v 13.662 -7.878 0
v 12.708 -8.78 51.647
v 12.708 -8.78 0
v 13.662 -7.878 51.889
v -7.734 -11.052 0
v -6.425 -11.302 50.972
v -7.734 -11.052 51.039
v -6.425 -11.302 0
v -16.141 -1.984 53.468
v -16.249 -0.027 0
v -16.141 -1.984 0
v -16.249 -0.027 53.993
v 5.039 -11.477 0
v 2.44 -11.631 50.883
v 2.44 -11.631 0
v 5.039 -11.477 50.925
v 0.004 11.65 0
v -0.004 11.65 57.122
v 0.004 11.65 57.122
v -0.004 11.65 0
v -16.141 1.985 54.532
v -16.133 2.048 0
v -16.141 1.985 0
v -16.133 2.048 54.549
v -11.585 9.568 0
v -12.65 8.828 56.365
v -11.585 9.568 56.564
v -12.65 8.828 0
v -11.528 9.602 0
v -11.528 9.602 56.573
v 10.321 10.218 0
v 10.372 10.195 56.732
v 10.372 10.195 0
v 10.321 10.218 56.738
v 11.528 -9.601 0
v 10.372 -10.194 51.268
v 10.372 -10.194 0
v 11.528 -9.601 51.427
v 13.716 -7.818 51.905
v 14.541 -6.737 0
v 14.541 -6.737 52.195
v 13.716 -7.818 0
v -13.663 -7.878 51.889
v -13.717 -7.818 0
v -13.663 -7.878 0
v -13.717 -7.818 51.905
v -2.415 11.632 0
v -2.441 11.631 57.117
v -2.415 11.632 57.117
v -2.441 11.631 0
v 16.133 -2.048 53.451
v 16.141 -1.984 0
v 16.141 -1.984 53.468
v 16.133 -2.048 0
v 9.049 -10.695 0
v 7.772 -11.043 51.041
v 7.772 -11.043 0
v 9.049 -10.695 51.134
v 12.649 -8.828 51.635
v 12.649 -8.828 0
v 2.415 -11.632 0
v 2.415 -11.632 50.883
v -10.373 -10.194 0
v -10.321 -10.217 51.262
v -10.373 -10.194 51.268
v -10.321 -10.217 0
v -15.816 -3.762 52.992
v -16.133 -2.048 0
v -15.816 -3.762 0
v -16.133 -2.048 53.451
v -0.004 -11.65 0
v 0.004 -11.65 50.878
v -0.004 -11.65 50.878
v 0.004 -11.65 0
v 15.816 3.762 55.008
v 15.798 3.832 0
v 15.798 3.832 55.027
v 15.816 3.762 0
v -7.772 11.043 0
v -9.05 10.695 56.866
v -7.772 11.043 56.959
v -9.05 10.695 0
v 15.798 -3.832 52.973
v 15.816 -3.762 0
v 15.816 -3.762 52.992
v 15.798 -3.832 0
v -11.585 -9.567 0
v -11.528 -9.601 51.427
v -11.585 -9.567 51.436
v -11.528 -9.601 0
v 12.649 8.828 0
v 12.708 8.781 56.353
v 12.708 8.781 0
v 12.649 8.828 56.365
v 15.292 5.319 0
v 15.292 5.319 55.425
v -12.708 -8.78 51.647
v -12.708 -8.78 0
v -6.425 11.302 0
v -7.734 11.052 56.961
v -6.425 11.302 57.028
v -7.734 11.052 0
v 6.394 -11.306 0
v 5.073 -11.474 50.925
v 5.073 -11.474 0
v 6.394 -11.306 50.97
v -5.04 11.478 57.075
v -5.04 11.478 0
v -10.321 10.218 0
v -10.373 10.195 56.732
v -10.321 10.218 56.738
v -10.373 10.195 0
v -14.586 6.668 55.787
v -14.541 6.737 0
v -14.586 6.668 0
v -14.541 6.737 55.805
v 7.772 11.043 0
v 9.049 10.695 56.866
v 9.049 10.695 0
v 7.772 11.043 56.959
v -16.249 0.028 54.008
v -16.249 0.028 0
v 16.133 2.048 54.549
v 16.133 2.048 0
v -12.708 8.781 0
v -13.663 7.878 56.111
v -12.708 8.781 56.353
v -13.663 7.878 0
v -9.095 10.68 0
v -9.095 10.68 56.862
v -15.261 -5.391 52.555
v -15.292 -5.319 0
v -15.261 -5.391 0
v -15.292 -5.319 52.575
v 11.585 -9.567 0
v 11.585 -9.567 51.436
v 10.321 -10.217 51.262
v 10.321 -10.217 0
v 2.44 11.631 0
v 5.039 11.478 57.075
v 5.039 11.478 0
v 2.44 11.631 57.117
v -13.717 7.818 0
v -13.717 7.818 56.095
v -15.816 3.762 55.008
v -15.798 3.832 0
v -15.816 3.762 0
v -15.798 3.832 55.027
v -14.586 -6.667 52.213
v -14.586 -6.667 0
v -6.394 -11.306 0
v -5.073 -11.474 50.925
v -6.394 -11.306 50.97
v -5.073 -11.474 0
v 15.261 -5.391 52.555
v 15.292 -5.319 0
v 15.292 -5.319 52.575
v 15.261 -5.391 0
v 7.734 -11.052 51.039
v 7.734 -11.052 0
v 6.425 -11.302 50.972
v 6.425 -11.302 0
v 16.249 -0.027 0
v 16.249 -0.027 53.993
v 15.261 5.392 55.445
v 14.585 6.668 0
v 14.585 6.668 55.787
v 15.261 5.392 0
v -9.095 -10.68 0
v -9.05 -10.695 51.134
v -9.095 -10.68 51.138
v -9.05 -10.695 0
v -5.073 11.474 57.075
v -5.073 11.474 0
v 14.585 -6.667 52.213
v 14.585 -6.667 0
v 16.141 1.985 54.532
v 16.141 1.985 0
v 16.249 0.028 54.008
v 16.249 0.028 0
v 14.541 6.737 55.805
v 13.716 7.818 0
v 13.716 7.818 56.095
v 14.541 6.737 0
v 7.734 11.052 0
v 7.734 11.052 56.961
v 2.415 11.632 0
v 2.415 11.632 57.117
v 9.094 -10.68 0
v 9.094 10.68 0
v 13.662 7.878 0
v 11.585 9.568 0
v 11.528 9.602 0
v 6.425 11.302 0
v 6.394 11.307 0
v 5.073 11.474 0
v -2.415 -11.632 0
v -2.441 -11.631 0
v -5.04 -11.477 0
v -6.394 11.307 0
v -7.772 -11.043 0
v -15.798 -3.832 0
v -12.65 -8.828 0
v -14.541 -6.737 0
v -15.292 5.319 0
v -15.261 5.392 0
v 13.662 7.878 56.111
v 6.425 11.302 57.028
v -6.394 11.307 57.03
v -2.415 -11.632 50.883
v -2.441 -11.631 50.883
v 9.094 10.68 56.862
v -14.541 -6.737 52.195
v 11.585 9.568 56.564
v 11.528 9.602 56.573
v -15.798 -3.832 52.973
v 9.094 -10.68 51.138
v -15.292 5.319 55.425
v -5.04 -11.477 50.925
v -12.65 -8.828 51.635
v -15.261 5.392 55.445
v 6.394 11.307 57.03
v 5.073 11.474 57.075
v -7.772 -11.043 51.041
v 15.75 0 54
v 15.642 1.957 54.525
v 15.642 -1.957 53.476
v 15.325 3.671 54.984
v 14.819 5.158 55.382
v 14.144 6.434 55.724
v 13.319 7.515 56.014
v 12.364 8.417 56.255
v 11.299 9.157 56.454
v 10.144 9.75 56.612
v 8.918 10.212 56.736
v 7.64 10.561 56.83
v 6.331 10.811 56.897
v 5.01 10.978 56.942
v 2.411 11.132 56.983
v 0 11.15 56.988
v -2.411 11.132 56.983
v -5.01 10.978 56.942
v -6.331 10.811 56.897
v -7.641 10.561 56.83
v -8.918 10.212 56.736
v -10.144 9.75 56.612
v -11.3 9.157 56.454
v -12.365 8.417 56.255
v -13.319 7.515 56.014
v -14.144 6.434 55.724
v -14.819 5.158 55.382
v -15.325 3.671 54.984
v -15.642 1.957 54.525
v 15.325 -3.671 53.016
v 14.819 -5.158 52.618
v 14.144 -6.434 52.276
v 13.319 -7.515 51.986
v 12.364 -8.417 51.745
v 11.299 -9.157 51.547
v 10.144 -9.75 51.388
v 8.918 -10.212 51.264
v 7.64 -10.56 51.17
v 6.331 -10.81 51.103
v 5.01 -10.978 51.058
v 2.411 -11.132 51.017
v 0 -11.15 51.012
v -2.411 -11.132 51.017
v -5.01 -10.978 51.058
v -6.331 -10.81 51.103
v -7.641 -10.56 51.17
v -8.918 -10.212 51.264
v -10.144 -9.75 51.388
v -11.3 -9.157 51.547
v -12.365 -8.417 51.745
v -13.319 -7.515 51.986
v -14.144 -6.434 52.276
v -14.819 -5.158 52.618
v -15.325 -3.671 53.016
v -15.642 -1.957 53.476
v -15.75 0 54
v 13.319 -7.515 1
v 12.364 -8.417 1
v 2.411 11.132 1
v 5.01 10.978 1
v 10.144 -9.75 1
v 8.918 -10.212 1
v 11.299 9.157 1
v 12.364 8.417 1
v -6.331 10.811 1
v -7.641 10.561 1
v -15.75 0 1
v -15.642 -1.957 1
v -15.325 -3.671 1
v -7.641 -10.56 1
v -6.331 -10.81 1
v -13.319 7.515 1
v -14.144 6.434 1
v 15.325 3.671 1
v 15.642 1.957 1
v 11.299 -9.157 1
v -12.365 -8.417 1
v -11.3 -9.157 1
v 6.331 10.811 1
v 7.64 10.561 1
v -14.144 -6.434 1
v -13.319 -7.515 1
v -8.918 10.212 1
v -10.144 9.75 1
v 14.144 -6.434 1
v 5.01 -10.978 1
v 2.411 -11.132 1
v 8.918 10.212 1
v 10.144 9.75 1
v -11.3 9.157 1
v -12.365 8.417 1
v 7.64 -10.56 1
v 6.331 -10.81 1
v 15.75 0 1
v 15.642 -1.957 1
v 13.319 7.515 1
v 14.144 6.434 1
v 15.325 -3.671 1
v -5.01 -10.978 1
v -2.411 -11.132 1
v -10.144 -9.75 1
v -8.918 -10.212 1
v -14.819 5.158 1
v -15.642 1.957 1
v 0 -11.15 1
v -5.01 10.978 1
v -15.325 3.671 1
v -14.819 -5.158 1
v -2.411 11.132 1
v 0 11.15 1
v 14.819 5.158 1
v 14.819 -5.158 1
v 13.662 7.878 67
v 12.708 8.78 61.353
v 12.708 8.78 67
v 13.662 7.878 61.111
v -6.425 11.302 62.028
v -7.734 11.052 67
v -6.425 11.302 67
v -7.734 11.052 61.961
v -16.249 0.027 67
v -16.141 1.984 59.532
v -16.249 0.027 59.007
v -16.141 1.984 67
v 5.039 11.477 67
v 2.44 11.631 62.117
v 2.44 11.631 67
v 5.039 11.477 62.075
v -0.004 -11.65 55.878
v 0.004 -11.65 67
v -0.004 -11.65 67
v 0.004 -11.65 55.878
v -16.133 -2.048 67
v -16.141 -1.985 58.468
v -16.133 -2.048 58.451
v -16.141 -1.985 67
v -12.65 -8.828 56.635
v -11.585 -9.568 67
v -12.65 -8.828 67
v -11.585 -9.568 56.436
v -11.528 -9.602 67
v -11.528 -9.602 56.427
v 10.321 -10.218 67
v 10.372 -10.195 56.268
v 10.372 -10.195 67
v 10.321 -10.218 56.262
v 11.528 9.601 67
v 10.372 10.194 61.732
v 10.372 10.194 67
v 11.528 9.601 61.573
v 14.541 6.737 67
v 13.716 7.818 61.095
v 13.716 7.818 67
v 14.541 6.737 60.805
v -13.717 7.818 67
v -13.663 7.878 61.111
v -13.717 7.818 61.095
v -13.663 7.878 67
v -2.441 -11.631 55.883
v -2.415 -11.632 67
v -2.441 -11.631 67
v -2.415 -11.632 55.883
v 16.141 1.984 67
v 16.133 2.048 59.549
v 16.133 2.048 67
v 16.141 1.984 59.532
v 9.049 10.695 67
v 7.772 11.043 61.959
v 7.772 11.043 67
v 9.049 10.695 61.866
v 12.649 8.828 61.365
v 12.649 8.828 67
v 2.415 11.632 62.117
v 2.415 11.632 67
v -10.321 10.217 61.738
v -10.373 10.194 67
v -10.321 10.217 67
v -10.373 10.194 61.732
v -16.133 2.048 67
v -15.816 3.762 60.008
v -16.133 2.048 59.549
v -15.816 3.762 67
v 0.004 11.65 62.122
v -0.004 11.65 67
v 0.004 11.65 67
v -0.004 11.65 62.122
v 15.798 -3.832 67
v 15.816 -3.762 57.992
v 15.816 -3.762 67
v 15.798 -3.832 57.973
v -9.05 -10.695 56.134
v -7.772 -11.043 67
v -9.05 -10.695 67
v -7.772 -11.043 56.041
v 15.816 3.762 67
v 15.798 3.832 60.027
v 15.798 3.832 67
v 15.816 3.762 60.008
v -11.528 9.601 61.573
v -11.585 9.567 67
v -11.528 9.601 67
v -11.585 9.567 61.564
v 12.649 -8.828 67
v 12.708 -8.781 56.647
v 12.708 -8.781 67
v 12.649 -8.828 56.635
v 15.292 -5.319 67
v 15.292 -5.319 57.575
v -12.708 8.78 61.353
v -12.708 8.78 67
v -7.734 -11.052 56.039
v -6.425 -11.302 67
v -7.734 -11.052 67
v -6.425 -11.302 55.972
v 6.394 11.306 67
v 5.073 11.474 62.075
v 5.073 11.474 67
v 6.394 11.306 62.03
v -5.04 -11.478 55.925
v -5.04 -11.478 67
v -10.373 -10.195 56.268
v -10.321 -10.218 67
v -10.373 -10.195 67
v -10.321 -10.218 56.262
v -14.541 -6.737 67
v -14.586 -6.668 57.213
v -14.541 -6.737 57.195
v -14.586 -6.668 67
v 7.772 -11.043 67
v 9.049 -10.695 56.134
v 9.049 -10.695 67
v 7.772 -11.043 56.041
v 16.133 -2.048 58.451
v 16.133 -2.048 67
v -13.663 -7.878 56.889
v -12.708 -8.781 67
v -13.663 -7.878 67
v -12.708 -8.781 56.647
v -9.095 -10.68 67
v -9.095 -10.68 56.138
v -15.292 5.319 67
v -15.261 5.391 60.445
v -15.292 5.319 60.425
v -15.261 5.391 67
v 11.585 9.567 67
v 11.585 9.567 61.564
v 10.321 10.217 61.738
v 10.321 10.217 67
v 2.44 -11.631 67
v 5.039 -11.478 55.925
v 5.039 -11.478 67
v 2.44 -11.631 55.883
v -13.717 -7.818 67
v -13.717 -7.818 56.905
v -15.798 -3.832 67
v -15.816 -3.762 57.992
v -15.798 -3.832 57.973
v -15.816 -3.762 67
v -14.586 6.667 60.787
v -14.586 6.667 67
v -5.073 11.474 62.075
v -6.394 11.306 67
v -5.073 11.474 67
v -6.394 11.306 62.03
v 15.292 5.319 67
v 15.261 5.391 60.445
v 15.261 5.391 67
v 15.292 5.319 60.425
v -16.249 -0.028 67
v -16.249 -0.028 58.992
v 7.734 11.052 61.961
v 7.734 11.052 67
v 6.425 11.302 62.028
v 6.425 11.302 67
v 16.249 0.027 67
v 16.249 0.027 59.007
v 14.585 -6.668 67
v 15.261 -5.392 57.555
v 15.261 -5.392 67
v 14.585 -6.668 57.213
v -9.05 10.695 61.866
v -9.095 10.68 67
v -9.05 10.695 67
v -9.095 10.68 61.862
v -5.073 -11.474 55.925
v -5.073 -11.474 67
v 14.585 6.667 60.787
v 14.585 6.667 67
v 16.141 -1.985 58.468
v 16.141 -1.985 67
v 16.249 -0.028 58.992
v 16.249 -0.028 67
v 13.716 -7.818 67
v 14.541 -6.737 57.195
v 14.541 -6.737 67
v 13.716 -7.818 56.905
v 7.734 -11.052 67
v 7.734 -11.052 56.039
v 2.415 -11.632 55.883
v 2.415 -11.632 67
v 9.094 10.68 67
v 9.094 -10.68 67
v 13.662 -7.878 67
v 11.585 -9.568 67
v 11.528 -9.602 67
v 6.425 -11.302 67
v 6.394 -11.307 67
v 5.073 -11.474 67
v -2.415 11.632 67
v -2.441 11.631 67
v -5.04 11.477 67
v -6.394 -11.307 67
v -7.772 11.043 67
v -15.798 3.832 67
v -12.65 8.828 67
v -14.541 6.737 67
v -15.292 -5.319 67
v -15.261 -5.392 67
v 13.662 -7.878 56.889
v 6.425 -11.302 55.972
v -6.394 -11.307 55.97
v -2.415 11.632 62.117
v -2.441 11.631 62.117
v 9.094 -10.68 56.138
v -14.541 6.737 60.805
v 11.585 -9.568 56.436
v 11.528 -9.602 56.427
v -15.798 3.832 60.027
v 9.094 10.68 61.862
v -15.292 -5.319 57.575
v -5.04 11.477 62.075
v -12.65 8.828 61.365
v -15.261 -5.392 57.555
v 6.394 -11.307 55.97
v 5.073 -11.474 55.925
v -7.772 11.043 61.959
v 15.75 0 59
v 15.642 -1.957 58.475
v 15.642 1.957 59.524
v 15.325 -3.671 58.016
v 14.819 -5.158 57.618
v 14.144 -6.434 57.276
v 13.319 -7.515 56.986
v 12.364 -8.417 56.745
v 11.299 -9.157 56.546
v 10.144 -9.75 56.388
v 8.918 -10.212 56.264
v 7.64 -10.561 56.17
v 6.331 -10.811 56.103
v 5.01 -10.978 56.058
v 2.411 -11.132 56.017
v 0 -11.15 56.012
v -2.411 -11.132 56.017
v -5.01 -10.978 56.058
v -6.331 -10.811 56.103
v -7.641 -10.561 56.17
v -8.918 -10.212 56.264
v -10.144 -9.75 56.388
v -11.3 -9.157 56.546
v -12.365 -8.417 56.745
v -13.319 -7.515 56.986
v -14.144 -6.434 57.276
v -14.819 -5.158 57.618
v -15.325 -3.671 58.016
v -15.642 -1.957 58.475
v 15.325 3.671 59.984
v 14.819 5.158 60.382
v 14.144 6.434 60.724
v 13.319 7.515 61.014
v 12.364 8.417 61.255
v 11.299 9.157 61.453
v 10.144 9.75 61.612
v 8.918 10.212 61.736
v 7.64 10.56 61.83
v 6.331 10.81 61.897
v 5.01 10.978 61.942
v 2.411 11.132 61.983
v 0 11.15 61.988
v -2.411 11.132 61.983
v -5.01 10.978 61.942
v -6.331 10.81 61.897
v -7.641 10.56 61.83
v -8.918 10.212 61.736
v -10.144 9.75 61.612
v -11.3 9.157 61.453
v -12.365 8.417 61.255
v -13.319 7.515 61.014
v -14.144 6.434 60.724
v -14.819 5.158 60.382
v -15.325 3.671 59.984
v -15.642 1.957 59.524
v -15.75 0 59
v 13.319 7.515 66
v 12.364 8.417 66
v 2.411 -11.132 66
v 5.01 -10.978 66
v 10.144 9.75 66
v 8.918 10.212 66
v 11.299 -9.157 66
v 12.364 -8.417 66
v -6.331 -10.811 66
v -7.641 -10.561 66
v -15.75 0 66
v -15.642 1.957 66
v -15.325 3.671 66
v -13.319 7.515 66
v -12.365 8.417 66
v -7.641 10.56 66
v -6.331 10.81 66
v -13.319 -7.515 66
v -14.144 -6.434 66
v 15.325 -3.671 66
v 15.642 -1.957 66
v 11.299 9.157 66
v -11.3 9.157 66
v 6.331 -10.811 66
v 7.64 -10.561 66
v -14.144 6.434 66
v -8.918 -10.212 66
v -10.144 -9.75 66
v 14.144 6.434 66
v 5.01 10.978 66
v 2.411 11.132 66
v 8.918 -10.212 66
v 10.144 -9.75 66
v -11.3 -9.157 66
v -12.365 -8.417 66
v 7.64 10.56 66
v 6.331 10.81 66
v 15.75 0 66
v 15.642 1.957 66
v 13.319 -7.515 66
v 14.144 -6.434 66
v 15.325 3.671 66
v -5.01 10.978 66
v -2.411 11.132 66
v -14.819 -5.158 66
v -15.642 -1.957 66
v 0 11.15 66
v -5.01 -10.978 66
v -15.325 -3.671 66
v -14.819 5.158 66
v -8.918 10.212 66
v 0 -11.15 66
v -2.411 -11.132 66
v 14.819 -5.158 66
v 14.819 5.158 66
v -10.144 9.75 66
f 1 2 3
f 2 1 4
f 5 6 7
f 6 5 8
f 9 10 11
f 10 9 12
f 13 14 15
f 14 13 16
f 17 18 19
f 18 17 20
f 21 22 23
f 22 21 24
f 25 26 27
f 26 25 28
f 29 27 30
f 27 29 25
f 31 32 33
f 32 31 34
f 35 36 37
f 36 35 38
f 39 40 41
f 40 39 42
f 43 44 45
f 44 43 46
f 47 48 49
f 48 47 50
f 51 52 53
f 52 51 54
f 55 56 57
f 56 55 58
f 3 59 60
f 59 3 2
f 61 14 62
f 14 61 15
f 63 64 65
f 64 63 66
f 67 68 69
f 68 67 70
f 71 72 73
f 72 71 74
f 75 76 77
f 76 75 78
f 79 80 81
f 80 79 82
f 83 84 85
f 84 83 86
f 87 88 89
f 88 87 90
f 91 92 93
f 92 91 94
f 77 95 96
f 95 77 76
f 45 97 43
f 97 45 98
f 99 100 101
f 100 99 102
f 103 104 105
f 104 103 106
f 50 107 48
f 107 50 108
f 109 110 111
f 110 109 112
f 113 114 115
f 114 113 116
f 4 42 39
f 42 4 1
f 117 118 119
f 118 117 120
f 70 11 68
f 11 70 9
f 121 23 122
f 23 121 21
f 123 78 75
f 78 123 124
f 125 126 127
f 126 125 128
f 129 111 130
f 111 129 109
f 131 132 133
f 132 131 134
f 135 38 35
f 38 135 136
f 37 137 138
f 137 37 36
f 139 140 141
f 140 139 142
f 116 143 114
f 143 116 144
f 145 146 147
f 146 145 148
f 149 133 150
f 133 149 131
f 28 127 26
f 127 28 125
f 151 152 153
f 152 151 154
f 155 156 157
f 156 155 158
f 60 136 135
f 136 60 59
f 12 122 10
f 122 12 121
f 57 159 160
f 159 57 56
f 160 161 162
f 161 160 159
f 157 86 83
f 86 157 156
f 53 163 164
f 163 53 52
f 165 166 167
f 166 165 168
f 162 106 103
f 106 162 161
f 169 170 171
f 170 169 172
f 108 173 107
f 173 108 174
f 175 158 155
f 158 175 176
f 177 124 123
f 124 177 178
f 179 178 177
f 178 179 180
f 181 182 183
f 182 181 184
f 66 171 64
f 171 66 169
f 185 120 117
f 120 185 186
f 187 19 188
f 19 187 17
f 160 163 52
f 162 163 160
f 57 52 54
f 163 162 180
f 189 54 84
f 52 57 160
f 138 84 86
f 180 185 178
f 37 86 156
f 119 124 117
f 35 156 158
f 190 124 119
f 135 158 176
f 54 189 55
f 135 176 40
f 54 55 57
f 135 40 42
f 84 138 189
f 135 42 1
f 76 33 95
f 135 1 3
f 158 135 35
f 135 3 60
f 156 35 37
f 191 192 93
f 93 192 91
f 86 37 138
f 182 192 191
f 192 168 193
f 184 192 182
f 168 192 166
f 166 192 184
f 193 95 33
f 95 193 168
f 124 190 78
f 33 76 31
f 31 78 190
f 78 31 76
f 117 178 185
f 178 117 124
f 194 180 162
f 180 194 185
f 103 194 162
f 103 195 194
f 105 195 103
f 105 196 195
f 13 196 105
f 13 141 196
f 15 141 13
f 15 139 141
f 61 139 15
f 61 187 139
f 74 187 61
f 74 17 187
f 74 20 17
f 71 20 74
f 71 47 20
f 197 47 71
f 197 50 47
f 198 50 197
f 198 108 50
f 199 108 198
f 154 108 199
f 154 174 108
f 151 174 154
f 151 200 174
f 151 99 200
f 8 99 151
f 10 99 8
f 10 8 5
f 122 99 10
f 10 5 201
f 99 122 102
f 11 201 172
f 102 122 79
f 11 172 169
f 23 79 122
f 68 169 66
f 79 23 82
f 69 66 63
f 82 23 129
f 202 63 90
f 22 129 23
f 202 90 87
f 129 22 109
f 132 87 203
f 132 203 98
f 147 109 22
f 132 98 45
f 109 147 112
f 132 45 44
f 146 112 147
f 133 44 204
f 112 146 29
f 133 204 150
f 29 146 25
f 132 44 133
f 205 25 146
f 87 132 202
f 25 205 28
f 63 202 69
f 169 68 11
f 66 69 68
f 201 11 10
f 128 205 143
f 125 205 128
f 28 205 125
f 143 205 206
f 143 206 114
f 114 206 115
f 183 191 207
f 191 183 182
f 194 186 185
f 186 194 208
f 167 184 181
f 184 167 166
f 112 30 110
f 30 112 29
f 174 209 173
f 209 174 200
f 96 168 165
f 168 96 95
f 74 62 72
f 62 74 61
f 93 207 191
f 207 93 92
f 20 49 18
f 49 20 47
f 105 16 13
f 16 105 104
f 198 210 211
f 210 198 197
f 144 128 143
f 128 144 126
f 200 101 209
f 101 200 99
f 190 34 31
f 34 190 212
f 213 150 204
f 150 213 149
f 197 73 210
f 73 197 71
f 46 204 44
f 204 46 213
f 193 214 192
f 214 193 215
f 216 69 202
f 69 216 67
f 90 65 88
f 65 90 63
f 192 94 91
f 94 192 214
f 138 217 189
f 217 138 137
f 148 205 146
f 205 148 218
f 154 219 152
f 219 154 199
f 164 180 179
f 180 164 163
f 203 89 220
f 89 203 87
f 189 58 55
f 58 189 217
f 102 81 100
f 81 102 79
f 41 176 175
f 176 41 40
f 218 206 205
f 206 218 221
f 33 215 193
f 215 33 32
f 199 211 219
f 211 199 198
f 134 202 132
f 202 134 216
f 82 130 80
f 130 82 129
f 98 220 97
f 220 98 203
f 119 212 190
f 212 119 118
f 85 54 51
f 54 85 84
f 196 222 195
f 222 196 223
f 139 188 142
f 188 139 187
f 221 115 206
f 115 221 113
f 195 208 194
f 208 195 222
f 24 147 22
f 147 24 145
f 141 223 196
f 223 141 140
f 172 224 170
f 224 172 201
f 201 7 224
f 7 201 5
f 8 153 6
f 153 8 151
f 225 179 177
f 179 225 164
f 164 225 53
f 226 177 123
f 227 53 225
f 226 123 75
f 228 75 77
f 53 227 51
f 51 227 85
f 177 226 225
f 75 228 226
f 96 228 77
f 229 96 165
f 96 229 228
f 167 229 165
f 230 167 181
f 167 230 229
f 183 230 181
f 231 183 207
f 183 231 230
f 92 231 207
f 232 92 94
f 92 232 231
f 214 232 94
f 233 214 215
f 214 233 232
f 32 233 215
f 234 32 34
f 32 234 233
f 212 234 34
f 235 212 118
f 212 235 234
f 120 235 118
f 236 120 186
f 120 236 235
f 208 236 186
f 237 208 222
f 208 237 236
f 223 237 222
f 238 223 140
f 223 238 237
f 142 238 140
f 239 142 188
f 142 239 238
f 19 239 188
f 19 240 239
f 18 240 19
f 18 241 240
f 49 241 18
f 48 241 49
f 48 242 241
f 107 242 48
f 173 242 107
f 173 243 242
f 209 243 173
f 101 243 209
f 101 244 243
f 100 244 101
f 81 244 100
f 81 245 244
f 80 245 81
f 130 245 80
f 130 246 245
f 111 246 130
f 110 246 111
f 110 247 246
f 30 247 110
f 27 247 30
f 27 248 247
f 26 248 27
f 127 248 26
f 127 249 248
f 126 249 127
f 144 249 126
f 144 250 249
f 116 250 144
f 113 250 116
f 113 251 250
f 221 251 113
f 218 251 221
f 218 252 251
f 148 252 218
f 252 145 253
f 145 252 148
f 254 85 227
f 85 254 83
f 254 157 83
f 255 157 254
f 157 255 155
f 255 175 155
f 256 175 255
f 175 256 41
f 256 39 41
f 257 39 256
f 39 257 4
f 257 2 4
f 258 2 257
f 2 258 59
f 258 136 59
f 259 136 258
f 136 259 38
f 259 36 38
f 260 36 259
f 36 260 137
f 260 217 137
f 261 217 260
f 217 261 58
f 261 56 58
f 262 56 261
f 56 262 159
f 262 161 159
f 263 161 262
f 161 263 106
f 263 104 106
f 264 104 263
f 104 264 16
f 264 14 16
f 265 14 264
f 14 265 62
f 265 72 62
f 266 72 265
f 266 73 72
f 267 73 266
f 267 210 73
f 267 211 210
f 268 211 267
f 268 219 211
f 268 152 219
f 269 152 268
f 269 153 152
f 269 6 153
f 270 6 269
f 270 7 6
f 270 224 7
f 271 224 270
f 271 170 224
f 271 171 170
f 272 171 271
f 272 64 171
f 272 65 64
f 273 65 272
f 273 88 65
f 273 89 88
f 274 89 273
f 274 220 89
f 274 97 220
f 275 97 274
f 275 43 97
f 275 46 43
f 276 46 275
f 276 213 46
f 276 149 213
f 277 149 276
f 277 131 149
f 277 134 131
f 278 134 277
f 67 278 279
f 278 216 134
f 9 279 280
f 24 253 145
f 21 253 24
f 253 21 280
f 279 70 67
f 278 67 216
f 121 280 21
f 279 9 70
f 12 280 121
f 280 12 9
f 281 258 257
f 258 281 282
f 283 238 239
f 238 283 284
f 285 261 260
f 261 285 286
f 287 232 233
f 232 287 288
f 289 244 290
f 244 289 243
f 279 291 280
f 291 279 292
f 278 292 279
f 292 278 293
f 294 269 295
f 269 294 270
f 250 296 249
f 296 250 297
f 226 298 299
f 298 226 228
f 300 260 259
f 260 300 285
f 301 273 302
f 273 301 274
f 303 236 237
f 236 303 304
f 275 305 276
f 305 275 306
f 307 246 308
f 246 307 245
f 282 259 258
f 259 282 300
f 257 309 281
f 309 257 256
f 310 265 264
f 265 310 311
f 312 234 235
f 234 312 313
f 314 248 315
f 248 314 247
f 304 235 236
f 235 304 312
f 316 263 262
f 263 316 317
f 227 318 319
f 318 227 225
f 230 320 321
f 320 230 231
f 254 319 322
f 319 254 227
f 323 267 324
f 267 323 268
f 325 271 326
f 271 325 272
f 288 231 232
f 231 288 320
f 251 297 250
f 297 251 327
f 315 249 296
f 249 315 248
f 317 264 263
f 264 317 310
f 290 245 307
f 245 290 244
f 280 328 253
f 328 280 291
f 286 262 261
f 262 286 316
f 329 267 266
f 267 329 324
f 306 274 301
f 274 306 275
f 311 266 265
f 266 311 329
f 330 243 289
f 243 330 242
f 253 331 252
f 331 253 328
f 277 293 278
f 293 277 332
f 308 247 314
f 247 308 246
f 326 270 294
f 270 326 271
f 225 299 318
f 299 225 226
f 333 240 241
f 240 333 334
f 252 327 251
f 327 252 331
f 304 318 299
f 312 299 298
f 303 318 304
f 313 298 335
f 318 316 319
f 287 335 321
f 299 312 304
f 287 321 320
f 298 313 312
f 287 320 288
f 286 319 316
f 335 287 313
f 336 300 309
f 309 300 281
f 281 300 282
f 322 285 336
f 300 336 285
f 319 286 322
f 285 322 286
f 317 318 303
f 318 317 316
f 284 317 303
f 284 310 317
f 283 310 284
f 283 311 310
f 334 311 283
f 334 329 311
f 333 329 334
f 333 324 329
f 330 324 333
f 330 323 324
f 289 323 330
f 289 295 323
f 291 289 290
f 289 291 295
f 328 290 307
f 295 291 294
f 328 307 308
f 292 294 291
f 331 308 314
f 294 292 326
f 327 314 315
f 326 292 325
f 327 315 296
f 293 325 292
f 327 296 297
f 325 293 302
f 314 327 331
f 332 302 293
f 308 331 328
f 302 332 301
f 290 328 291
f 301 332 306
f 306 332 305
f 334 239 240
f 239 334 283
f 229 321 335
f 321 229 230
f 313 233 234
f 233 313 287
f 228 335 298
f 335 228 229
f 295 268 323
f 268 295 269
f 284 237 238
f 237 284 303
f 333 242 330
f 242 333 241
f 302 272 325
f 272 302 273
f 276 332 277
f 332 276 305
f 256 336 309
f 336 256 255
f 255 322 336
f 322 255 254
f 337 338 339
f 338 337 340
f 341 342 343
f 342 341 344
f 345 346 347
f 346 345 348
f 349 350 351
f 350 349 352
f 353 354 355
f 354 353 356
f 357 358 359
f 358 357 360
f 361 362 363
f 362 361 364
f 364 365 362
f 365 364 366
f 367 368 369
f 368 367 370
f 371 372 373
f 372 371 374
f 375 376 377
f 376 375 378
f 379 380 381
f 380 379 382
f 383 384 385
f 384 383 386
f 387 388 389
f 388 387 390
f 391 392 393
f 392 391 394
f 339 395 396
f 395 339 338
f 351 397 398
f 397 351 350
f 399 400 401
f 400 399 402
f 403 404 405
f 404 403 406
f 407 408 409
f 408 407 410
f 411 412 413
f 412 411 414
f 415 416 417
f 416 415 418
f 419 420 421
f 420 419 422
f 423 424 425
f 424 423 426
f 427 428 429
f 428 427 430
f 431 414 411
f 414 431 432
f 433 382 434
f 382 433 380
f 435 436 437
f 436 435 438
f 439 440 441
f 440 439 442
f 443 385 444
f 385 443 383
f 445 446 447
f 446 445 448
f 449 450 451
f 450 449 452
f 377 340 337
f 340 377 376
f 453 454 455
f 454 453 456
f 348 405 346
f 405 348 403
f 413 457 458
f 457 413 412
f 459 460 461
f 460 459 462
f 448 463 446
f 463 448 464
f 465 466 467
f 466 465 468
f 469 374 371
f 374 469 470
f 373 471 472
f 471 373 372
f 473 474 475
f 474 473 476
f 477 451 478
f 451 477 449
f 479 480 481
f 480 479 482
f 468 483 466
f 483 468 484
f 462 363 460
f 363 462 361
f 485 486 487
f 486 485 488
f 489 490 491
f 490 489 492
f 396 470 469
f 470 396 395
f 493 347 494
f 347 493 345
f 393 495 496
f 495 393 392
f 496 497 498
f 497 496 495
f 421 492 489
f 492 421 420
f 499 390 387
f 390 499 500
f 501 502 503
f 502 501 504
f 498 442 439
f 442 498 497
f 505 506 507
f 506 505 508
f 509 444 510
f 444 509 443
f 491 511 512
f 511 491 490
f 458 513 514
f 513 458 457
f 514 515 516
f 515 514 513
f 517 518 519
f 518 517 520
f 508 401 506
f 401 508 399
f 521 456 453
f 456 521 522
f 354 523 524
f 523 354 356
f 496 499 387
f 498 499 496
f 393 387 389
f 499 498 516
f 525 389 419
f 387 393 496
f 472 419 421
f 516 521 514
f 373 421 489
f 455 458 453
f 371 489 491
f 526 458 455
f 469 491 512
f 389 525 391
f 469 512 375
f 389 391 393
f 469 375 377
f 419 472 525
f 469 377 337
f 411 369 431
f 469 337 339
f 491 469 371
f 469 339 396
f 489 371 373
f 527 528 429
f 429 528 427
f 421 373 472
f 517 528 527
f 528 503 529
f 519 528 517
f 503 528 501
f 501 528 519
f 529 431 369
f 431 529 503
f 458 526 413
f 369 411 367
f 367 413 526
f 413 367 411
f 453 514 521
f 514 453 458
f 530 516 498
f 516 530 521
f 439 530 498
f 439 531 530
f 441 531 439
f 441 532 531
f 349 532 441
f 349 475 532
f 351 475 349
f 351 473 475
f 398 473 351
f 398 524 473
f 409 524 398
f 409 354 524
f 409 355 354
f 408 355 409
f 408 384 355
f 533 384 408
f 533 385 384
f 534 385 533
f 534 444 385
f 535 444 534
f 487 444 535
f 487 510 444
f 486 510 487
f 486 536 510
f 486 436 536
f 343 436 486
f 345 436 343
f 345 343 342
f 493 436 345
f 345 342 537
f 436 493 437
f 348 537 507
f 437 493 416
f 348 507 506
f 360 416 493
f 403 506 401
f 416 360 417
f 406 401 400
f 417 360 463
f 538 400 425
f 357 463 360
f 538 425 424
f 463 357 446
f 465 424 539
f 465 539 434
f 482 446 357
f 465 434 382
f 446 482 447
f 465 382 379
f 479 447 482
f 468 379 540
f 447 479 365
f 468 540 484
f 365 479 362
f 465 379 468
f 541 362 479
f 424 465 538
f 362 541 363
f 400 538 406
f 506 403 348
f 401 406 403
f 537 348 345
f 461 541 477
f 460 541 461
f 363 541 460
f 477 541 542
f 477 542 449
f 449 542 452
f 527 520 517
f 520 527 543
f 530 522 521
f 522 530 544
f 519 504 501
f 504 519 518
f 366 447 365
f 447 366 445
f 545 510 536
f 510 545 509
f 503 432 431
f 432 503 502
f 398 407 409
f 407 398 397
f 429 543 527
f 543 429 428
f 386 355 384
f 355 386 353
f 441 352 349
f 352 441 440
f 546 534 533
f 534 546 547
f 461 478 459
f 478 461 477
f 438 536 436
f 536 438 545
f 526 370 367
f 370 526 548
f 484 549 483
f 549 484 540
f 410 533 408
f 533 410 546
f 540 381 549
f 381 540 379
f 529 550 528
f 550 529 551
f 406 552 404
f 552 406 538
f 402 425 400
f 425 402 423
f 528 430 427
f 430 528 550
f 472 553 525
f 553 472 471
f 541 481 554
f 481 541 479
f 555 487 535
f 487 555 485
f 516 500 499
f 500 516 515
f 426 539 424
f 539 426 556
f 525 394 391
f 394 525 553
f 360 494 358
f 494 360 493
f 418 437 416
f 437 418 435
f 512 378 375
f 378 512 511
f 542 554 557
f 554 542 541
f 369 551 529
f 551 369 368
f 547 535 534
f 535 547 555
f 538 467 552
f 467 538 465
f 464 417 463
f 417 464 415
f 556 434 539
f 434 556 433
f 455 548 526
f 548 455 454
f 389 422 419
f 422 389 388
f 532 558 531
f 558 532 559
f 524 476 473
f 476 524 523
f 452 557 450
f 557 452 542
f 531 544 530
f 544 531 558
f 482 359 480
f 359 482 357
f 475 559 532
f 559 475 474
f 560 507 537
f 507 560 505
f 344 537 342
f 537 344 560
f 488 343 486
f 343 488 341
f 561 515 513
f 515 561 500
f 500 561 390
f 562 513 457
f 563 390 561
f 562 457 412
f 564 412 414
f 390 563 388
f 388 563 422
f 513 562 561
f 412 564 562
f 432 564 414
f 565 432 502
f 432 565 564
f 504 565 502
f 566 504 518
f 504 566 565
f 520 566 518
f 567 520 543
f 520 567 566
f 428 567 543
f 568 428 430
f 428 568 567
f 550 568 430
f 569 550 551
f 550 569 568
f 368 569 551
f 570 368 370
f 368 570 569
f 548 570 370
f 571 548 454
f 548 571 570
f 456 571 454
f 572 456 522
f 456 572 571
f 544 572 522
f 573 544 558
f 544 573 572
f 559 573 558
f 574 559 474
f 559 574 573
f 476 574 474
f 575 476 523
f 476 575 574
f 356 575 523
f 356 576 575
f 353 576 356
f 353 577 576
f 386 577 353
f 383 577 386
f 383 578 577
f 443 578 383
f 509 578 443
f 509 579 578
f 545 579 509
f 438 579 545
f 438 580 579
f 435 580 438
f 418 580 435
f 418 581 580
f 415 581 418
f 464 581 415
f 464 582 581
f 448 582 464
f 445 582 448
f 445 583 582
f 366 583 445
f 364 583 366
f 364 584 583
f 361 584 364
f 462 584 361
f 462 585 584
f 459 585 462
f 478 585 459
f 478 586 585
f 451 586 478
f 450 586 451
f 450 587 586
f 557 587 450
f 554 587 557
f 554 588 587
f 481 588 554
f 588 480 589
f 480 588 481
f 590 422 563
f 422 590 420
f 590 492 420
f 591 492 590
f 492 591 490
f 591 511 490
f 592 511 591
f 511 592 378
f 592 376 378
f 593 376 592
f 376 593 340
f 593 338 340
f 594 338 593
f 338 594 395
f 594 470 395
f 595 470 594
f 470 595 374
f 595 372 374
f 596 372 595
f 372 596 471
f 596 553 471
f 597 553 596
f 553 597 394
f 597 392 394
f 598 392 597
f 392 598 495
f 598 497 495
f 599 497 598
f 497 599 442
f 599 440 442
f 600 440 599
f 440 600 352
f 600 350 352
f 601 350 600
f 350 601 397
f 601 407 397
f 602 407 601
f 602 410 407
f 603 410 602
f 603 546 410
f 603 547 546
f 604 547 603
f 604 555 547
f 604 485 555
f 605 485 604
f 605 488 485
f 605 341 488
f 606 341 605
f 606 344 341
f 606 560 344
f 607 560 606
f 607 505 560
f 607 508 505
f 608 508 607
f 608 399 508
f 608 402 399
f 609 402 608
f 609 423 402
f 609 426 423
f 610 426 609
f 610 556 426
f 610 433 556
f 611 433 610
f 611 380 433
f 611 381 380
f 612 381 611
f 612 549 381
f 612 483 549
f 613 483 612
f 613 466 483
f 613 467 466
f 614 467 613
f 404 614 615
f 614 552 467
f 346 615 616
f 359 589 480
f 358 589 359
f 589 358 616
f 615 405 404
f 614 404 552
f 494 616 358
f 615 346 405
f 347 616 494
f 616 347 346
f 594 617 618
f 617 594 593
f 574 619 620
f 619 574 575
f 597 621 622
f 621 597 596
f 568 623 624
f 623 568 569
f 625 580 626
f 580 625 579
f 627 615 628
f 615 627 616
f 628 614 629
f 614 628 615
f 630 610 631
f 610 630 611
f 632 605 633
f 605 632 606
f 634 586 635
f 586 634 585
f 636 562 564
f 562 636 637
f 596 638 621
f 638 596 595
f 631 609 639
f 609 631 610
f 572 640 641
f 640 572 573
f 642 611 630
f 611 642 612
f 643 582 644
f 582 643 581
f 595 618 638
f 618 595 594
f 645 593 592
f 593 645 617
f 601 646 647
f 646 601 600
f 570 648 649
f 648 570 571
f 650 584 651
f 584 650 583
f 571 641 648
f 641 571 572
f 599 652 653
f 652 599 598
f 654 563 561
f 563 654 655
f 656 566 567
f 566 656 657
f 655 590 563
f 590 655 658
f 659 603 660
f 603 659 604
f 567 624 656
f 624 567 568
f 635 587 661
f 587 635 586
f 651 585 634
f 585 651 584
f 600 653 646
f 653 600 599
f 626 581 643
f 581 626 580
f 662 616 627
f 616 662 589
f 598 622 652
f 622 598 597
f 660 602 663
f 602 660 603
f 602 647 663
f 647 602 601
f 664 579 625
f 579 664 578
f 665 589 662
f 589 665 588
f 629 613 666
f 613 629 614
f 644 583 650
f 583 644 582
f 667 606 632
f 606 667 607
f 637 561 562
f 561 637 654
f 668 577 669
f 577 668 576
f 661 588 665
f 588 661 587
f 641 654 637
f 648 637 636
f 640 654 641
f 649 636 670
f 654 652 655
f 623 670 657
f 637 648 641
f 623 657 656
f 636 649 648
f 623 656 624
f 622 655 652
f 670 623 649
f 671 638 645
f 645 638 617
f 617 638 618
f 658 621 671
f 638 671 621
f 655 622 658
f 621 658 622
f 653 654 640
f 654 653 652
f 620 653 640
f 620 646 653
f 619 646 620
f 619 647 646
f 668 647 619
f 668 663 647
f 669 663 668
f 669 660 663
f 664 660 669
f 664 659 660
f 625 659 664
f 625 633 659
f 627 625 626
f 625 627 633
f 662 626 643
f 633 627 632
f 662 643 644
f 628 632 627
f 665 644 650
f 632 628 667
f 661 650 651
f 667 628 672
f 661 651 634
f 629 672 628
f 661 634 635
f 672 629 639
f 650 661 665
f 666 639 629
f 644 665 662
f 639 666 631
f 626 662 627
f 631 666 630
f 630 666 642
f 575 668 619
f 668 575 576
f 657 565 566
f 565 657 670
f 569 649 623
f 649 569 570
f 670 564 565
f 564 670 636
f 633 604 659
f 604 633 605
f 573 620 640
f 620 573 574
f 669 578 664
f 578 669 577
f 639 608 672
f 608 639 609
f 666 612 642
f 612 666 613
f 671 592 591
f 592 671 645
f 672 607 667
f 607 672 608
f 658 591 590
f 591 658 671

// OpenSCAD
wall = 0.5;
base = 1;
inner = [31.5, 22.3, 60];
lid_angle = 15;
lid_gap = 5;
lid_height = 8; // Outer height from top, x=0

outer = [inner.x + wall * 2, inner.y + wall * 2, inner.z + base * 2];
lid_height_delta = sin(lid_angle) * outer.y;

module outline() 
{
	data_extents = [[950.464, 897.76], [1323.82, 1159.95]];

	scale([inner.x / (data_extents[1].x - data_extents[0].x), inner.y / (data_extents[1].y - data_extents[0].y)])
	translate([-data_extents[0].x, -data_extents[0].y])
	translate([(data_extents[0].x - data_extents[1].x) / 2, (data_extents[0].y - data_extents[1].y) / 2])
	polygon
	([
		[1108.56399023,897.973521484], [1077.75648438,899.779046875], [1062.09858765,901.752113037], [1046.58201758,904.691142578], [1031.43984106,908.785456299], [1016.905125,914.224375], [1003.21093628,921.197219482], [990.590341797,929.893310547], [979.276408447,940.501968994], [969.502203125,953.212515625], [961.500792725,968.21427124], [955.505244141,985.696556641], [951.748624268,1005.84869263], [950.464,1028.86], [951.748624268,1051.86990967], [955.505244141,1072.02083984], [961.500792725,1089.50209229], [969.502203125,1104.50296875], [979.276408447,1117.212771], [990.590341797,1127.82080078], [1003.21093628,1136.51635986], [1016.905125,1143.48875], [1031.43984106,1148.92727295], [1046.58201758,1153.02123047], [1062.09858765,1155.95992432], [1077.75648438,1157.93265625], [1108.56399023,1159.73744141], [1137.14,1159.95], [1165.71597656,1159.73744141], [1196.5234375,1157.93265625], [1212.18133301,1155.95992432], [1227.69792969,1153.02123047], [1242.8401709,1148.92727295], [1257.375,1143.48875], [1271.06936035,1136.51635986], [1283.69019531,1127.82080078], [1295.00444824,1117.212771], [1304.7790625,1104.50296875], [1312.78098145,1089.50209229], [1318.77714844,1072.02083984], [1322.53450684,1051.86990967], [1323.82,1028.86], [1322.53450684,1005.84869263], [1318.77714844,985.696556641], [1312.78098145,968.21427124], [1304.7790625,953.212515625], [1295.00444824,940.501968994], [1283.69019531,929.893310547], [1271.06936035,921.197219482], [1257.375,914.224375], [1242.8401709,908.785456299], [1227.69792969,904.691142578], [1212.18133301,901.752113037], [1196.5234375,899.779046875], [1165.71597656,897.973521484], [1137.14,897.76]	
	]);
}

module clip(height)
{
	s = [outer.x * 2, outer.y * 2, lid_height_delta * 2];
	translate([0, 0, height])
	rotate([lid_angle, 0, 0])
	translate([-s.x / 2, -s.y / 2, 0])
	cube(s);
}

module tube(outer_height, is_inner)
{
	offset = is_inner ? 0 : wall;
	translate = is_inner ? base : 0;
	h = wall + outer_height + lid_height_delta / 2;
	difference()
	{
		translate([0, 0, translate]) linear_extrude(h) offset(r=offset) outline();
		if (!is_inner)
			clip(outer_height);
	}
}

module body()
{
	color("yellow") 
	difference()
	{
		tube(outer.z - lid_height, false);
		tube(outer.z - lid_height, true);
	}
}

module lid()
{
	color("red") 
	translate([0, 0, outer.z + lid_gap]) 
	rotate([180, 0, 0])
	difference()
	{
		tube(lid_height, false);
		tube(lid_height, true);
	}
}

module main()
{
	body();
	lid();
}

main();
